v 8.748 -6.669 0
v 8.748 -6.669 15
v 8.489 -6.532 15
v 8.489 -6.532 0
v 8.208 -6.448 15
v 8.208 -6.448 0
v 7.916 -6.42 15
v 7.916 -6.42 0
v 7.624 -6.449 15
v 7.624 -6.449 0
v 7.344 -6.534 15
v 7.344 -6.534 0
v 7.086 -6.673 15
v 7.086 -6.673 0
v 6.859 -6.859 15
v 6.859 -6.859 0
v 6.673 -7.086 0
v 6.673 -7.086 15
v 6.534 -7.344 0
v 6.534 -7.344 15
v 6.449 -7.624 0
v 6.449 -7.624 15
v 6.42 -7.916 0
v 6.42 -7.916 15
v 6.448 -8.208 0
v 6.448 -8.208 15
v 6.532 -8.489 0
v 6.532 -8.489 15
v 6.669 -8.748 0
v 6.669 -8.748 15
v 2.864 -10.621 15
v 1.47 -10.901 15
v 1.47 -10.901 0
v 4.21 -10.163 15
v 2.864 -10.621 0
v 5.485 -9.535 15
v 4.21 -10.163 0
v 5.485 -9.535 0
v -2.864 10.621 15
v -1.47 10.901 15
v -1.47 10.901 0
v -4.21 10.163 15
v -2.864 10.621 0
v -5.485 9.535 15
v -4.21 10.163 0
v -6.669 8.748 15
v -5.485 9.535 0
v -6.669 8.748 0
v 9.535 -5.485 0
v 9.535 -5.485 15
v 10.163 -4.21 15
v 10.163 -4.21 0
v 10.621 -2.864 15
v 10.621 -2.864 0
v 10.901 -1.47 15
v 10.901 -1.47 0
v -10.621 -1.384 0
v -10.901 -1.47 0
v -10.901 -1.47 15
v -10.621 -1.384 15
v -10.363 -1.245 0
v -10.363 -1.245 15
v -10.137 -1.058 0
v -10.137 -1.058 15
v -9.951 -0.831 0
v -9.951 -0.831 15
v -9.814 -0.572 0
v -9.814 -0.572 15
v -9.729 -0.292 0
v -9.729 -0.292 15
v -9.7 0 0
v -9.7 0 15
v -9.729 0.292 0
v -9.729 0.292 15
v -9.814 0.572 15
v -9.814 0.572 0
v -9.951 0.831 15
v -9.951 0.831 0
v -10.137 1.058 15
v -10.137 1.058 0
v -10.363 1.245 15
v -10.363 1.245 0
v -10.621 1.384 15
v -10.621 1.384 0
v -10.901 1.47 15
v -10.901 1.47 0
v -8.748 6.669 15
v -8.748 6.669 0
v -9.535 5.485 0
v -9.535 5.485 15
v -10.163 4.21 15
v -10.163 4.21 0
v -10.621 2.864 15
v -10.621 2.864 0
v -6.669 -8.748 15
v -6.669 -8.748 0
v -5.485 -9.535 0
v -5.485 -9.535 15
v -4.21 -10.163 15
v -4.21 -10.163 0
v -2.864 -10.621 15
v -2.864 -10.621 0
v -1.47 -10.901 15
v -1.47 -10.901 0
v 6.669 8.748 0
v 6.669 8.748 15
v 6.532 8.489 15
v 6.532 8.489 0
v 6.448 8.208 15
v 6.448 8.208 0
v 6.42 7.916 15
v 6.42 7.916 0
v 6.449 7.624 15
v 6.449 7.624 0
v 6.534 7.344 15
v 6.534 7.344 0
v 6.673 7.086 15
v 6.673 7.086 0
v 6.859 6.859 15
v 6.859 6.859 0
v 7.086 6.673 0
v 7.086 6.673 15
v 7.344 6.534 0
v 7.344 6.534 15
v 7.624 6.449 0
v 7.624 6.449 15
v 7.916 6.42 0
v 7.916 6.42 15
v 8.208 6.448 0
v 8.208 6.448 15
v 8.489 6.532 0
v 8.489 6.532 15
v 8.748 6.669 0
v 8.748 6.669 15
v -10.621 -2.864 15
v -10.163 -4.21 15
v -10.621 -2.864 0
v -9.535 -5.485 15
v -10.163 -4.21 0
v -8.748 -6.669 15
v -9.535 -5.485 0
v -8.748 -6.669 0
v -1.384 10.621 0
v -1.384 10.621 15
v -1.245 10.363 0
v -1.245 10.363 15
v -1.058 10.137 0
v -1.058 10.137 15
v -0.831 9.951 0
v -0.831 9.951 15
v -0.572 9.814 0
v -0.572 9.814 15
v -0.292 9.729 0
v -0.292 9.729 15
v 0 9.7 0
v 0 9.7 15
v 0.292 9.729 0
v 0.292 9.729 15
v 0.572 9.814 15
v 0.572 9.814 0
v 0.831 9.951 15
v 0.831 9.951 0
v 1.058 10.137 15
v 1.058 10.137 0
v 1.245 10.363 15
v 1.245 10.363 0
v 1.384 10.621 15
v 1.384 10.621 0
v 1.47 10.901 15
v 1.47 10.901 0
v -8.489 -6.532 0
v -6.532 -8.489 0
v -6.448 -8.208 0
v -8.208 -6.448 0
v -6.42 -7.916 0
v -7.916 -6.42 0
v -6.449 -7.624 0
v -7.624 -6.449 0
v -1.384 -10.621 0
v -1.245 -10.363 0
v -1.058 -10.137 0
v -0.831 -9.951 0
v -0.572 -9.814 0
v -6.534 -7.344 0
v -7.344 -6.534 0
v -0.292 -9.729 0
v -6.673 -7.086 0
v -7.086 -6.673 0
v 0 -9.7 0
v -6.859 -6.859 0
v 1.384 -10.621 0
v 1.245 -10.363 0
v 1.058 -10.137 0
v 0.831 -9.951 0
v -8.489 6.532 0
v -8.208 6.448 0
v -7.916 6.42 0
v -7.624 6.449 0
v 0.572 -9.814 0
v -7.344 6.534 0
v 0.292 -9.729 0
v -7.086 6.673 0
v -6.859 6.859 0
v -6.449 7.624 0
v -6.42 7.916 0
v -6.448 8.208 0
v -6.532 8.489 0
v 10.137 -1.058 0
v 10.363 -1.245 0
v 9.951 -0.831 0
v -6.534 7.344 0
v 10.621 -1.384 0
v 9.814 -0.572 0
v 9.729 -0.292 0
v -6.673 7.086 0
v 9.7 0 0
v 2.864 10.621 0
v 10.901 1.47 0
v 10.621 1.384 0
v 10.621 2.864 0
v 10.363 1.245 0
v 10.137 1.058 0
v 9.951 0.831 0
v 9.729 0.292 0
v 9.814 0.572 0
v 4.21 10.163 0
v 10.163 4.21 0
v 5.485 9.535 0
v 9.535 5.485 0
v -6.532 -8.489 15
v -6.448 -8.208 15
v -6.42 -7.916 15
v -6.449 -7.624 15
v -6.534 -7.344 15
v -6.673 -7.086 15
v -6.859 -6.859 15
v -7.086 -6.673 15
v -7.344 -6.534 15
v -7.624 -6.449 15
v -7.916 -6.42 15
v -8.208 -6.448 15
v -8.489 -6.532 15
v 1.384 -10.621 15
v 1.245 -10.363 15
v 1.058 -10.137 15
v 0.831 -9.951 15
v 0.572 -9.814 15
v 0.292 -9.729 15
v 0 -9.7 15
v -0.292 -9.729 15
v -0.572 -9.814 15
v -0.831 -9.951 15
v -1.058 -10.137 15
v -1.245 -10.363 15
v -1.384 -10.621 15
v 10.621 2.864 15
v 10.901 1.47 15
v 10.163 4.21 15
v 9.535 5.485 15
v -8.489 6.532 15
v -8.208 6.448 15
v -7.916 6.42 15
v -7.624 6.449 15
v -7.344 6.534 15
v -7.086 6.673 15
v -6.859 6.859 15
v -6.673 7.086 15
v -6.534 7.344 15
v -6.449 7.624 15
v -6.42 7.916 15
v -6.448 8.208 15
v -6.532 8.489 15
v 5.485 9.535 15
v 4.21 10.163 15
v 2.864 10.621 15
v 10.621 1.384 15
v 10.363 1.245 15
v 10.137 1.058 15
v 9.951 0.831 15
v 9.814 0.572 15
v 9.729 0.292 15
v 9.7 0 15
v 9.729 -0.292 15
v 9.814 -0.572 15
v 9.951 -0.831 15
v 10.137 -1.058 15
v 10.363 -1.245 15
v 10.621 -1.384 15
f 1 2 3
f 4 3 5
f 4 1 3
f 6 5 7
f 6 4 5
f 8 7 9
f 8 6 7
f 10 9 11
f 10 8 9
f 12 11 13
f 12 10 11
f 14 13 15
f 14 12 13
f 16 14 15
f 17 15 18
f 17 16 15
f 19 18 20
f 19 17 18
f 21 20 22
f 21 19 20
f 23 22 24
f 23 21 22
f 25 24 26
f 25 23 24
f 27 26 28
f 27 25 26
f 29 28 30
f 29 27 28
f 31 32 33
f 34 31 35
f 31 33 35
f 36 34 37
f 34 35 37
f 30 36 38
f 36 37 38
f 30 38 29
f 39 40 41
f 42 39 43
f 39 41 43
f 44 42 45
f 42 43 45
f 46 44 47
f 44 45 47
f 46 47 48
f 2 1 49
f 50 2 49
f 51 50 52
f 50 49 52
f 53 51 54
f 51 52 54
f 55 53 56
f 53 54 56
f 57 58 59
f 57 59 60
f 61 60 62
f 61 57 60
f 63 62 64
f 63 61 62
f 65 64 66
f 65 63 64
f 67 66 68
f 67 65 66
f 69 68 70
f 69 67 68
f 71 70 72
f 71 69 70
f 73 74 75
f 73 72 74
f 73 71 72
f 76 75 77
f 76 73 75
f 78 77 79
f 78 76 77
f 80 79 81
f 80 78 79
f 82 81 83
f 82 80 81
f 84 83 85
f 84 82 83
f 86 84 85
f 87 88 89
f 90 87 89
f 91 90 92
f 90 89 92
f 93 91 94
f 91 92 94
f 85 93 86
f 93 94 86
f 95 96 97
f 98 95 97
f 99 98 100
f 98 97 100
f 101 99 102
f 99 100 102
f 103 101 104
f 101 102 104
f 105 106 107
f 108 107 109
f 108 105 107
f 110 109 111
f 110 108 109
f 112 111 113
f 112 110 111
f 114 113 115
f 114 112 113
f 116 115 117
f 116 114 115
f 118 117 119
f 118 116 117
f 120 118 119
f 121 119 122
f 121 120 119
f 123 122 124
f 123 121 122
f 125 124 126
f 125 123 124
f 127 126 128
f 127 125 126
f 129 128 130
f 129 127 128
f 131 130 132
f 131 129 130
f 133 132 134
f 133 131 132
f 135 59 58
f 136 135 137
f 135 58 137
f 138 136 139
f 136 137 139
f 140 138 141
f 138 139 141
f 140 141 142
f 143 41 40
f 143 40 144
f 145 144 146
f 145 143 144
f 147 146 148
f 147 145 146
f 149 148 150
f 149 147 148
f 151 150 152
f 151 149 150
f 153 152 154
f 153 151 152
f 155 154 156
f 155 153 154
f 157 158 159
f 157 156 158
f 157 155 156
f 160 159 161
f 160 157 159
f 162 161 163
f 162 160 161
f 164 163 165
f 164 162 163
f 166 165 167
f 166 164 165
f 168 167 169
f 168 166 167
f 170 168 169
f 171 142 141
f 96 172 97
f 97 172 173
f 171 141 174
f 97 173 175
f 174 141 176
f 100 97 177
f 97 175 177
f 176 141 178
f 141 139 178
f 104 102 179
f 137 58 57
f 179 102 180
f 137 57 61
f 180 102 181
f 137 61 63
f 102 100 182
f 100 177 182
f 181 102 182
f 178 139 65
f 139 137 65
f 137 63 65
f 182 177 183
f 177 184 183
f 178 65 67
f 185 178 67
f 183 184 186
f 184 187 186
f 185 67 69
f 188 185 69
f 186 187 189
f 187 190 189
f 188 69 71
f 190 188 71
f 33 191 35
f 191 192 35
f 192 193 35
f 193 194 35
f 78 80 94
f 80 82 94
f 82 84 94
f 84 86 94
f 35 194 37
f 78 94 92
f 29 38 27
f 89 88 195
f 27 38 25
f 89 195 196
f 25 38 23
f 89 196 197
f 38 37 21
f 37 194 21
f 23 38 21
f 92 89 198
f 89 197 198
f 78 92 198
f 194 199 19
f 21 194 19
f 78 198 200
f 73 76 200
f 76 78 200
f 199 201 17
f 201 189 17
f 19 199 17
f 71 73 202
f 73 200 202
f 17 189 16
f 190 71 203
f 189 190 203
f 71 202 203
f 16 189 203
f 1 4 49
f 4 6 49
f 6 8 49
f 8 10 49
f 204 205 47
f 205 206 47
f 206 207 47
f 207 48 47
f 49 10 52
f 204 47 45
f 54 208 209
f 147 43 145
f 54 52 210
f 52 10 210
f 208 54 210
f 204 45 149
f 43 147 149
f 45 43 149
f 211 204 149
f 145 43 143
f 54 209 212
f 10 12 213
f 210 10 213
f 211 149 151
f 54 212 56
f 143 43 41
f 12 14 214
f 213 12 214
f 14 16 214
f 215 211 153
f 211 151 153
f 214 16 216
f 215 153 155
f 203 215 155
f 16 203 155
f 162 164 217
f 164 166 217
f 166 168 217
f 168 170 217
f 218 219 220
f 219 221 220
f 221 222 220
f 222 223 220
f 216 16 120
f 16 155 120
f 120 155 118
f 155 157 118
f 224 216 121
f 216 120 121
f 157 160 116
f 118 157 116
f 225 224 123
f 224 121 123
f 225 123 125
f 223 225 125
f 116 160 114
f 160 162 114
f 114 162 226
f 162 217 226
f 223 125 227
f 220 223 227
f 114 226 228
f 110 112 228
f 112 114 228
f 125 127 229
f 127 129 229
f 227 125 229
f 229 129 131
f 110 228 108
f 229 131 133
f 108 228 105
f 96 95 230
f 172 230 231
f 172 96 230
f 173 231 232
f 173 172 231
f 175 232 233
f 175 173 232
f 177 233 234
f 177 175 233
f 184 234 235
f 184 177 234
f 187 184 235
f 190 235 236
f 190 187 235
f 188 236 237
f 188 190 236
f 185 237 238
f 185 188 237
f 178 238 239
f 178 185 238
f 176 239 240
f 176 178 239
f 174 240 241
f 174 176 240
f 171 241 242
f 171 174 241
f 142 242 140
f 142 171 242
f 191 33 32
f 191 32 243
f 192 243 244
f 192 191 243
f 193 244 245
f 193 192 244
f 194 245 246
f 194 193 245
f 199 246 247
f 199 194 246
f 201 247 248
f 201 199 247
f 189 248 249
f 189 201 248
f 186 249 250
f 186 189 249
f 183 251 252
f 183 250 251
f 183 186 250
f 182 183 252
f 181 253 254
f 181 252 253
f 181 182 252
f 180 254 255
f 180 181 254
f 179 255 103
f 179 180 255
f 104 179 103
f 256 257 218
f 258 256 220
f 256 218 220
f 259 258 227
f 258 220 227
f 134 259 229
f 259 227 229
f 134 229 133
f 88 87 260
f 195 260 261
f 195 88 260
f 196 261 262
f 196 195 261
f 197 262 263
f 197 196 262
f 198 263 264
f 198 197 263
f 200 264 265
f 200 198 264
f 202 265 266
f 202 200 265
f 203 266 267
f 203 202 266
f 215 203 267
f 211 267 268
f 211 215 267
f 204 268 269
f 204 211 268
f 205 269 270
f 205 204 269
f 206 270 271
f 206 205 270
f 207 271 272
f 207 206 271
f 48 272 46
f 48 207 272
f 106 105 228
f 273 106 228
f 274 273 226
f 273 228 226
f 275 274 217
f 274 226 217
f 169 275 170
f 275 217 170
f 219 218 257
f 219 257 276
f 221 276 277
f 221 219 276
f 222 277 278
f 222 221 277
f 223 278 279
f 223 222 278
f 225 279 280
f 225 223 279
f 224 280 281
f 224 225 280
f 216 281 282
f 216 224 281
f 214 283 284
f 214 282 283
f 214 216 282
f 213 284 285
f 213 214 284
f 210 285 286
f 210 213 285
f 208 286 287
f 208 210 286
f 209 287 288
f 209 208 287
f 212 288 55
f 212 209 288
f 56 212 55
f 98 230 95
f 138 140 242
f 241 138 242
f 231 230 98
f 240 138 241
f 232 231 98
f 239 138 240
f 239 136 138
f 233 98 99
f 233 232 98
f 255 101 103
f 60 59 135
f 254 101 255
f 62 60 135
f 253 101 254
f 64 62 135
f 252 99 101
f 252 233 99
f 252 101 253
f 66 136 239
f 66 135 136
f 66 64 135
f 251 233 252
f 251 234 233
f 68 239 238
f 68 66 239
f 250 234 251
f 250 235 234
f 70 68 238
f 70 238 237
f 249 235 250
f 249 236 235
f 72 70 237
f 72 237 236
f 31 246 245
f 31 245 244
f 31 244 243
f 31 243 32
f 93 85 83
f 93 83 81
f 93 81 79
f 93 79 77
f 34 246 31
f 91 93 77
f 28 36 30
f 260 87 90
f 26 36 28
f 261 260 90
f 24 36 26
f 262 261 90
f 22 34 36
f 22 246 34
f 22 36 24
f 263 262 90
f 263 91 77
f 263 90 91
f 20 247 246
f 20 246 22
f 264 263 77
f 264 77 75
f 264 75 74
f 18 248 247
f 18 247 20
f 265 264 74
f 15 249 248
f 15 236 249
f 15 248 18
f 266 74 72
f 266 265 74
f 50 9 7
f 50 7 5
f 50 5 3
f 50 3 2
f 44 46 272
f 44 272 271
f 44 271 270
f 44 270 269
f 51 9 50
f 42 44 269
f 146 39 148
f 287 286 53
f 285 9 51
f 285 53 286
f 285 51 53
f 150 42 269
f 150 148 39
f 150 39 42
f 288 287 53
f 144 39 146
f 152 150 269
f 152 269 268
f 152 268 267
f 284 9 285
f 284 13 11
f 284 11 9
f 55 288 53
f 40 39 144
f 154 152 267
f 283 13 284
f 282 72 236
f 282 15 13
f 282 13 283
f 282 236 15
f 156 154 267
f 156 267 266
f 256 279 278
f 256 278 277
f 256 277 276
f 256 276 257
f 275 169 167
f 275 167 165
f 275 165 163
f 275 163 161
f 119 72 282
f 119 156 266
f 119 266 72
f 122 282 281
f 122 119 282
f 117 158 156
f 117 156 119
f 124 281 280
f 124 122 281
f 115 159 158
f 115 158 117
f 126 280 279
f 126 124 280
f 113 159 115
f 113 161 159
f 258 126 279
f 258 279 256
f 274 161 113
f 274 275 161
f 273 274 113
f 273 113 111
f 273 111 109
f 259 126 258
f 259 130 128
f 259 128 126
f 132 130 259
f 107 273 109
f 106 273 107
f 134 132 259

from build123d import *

# Parameters (mm, degrees)
CYLINDER001_R     = 1.5
CYLINDER001_DEPTH = 20
ARRAY_COUNT       = 8
CYLINDER_R        = 11
CYLINDER_DEPTH    = 15


with BuildPart() as array:
    # Cylinder001 → Cylinder001 (new body)
    with BuildSketch(Plane(origin=(11.2, 0, 0), x_dir=(1, 0, 0), z_dir=(0, 0, 1))):
        Circle(CYLINDER001_R)
    extrude(amount=CYLINDER001_DEPTH)

    # Array: Array ×8 about axis
    array_axis = Axis((0, 0, 0), (0, 0, 1))


with BuildPart() as array_1:
    add(array.part)
    for i in range(1, ARRAY_COUNT):
        add(array.part.rotate(array_axis, i * 360 / ARRAY_COUNT))


with BuildPart() as cut:
    # Cylinder → Cylinder (new body)
    with BuildSketch(Plane.XY):
        Circle(CYLINDER_R)
    extrude(amount=CYLINDER_DEPTH)

    # Cut: cut Array
    add(array_1.part, mode=Mode.SUBTRACT)


solid = cut.part
